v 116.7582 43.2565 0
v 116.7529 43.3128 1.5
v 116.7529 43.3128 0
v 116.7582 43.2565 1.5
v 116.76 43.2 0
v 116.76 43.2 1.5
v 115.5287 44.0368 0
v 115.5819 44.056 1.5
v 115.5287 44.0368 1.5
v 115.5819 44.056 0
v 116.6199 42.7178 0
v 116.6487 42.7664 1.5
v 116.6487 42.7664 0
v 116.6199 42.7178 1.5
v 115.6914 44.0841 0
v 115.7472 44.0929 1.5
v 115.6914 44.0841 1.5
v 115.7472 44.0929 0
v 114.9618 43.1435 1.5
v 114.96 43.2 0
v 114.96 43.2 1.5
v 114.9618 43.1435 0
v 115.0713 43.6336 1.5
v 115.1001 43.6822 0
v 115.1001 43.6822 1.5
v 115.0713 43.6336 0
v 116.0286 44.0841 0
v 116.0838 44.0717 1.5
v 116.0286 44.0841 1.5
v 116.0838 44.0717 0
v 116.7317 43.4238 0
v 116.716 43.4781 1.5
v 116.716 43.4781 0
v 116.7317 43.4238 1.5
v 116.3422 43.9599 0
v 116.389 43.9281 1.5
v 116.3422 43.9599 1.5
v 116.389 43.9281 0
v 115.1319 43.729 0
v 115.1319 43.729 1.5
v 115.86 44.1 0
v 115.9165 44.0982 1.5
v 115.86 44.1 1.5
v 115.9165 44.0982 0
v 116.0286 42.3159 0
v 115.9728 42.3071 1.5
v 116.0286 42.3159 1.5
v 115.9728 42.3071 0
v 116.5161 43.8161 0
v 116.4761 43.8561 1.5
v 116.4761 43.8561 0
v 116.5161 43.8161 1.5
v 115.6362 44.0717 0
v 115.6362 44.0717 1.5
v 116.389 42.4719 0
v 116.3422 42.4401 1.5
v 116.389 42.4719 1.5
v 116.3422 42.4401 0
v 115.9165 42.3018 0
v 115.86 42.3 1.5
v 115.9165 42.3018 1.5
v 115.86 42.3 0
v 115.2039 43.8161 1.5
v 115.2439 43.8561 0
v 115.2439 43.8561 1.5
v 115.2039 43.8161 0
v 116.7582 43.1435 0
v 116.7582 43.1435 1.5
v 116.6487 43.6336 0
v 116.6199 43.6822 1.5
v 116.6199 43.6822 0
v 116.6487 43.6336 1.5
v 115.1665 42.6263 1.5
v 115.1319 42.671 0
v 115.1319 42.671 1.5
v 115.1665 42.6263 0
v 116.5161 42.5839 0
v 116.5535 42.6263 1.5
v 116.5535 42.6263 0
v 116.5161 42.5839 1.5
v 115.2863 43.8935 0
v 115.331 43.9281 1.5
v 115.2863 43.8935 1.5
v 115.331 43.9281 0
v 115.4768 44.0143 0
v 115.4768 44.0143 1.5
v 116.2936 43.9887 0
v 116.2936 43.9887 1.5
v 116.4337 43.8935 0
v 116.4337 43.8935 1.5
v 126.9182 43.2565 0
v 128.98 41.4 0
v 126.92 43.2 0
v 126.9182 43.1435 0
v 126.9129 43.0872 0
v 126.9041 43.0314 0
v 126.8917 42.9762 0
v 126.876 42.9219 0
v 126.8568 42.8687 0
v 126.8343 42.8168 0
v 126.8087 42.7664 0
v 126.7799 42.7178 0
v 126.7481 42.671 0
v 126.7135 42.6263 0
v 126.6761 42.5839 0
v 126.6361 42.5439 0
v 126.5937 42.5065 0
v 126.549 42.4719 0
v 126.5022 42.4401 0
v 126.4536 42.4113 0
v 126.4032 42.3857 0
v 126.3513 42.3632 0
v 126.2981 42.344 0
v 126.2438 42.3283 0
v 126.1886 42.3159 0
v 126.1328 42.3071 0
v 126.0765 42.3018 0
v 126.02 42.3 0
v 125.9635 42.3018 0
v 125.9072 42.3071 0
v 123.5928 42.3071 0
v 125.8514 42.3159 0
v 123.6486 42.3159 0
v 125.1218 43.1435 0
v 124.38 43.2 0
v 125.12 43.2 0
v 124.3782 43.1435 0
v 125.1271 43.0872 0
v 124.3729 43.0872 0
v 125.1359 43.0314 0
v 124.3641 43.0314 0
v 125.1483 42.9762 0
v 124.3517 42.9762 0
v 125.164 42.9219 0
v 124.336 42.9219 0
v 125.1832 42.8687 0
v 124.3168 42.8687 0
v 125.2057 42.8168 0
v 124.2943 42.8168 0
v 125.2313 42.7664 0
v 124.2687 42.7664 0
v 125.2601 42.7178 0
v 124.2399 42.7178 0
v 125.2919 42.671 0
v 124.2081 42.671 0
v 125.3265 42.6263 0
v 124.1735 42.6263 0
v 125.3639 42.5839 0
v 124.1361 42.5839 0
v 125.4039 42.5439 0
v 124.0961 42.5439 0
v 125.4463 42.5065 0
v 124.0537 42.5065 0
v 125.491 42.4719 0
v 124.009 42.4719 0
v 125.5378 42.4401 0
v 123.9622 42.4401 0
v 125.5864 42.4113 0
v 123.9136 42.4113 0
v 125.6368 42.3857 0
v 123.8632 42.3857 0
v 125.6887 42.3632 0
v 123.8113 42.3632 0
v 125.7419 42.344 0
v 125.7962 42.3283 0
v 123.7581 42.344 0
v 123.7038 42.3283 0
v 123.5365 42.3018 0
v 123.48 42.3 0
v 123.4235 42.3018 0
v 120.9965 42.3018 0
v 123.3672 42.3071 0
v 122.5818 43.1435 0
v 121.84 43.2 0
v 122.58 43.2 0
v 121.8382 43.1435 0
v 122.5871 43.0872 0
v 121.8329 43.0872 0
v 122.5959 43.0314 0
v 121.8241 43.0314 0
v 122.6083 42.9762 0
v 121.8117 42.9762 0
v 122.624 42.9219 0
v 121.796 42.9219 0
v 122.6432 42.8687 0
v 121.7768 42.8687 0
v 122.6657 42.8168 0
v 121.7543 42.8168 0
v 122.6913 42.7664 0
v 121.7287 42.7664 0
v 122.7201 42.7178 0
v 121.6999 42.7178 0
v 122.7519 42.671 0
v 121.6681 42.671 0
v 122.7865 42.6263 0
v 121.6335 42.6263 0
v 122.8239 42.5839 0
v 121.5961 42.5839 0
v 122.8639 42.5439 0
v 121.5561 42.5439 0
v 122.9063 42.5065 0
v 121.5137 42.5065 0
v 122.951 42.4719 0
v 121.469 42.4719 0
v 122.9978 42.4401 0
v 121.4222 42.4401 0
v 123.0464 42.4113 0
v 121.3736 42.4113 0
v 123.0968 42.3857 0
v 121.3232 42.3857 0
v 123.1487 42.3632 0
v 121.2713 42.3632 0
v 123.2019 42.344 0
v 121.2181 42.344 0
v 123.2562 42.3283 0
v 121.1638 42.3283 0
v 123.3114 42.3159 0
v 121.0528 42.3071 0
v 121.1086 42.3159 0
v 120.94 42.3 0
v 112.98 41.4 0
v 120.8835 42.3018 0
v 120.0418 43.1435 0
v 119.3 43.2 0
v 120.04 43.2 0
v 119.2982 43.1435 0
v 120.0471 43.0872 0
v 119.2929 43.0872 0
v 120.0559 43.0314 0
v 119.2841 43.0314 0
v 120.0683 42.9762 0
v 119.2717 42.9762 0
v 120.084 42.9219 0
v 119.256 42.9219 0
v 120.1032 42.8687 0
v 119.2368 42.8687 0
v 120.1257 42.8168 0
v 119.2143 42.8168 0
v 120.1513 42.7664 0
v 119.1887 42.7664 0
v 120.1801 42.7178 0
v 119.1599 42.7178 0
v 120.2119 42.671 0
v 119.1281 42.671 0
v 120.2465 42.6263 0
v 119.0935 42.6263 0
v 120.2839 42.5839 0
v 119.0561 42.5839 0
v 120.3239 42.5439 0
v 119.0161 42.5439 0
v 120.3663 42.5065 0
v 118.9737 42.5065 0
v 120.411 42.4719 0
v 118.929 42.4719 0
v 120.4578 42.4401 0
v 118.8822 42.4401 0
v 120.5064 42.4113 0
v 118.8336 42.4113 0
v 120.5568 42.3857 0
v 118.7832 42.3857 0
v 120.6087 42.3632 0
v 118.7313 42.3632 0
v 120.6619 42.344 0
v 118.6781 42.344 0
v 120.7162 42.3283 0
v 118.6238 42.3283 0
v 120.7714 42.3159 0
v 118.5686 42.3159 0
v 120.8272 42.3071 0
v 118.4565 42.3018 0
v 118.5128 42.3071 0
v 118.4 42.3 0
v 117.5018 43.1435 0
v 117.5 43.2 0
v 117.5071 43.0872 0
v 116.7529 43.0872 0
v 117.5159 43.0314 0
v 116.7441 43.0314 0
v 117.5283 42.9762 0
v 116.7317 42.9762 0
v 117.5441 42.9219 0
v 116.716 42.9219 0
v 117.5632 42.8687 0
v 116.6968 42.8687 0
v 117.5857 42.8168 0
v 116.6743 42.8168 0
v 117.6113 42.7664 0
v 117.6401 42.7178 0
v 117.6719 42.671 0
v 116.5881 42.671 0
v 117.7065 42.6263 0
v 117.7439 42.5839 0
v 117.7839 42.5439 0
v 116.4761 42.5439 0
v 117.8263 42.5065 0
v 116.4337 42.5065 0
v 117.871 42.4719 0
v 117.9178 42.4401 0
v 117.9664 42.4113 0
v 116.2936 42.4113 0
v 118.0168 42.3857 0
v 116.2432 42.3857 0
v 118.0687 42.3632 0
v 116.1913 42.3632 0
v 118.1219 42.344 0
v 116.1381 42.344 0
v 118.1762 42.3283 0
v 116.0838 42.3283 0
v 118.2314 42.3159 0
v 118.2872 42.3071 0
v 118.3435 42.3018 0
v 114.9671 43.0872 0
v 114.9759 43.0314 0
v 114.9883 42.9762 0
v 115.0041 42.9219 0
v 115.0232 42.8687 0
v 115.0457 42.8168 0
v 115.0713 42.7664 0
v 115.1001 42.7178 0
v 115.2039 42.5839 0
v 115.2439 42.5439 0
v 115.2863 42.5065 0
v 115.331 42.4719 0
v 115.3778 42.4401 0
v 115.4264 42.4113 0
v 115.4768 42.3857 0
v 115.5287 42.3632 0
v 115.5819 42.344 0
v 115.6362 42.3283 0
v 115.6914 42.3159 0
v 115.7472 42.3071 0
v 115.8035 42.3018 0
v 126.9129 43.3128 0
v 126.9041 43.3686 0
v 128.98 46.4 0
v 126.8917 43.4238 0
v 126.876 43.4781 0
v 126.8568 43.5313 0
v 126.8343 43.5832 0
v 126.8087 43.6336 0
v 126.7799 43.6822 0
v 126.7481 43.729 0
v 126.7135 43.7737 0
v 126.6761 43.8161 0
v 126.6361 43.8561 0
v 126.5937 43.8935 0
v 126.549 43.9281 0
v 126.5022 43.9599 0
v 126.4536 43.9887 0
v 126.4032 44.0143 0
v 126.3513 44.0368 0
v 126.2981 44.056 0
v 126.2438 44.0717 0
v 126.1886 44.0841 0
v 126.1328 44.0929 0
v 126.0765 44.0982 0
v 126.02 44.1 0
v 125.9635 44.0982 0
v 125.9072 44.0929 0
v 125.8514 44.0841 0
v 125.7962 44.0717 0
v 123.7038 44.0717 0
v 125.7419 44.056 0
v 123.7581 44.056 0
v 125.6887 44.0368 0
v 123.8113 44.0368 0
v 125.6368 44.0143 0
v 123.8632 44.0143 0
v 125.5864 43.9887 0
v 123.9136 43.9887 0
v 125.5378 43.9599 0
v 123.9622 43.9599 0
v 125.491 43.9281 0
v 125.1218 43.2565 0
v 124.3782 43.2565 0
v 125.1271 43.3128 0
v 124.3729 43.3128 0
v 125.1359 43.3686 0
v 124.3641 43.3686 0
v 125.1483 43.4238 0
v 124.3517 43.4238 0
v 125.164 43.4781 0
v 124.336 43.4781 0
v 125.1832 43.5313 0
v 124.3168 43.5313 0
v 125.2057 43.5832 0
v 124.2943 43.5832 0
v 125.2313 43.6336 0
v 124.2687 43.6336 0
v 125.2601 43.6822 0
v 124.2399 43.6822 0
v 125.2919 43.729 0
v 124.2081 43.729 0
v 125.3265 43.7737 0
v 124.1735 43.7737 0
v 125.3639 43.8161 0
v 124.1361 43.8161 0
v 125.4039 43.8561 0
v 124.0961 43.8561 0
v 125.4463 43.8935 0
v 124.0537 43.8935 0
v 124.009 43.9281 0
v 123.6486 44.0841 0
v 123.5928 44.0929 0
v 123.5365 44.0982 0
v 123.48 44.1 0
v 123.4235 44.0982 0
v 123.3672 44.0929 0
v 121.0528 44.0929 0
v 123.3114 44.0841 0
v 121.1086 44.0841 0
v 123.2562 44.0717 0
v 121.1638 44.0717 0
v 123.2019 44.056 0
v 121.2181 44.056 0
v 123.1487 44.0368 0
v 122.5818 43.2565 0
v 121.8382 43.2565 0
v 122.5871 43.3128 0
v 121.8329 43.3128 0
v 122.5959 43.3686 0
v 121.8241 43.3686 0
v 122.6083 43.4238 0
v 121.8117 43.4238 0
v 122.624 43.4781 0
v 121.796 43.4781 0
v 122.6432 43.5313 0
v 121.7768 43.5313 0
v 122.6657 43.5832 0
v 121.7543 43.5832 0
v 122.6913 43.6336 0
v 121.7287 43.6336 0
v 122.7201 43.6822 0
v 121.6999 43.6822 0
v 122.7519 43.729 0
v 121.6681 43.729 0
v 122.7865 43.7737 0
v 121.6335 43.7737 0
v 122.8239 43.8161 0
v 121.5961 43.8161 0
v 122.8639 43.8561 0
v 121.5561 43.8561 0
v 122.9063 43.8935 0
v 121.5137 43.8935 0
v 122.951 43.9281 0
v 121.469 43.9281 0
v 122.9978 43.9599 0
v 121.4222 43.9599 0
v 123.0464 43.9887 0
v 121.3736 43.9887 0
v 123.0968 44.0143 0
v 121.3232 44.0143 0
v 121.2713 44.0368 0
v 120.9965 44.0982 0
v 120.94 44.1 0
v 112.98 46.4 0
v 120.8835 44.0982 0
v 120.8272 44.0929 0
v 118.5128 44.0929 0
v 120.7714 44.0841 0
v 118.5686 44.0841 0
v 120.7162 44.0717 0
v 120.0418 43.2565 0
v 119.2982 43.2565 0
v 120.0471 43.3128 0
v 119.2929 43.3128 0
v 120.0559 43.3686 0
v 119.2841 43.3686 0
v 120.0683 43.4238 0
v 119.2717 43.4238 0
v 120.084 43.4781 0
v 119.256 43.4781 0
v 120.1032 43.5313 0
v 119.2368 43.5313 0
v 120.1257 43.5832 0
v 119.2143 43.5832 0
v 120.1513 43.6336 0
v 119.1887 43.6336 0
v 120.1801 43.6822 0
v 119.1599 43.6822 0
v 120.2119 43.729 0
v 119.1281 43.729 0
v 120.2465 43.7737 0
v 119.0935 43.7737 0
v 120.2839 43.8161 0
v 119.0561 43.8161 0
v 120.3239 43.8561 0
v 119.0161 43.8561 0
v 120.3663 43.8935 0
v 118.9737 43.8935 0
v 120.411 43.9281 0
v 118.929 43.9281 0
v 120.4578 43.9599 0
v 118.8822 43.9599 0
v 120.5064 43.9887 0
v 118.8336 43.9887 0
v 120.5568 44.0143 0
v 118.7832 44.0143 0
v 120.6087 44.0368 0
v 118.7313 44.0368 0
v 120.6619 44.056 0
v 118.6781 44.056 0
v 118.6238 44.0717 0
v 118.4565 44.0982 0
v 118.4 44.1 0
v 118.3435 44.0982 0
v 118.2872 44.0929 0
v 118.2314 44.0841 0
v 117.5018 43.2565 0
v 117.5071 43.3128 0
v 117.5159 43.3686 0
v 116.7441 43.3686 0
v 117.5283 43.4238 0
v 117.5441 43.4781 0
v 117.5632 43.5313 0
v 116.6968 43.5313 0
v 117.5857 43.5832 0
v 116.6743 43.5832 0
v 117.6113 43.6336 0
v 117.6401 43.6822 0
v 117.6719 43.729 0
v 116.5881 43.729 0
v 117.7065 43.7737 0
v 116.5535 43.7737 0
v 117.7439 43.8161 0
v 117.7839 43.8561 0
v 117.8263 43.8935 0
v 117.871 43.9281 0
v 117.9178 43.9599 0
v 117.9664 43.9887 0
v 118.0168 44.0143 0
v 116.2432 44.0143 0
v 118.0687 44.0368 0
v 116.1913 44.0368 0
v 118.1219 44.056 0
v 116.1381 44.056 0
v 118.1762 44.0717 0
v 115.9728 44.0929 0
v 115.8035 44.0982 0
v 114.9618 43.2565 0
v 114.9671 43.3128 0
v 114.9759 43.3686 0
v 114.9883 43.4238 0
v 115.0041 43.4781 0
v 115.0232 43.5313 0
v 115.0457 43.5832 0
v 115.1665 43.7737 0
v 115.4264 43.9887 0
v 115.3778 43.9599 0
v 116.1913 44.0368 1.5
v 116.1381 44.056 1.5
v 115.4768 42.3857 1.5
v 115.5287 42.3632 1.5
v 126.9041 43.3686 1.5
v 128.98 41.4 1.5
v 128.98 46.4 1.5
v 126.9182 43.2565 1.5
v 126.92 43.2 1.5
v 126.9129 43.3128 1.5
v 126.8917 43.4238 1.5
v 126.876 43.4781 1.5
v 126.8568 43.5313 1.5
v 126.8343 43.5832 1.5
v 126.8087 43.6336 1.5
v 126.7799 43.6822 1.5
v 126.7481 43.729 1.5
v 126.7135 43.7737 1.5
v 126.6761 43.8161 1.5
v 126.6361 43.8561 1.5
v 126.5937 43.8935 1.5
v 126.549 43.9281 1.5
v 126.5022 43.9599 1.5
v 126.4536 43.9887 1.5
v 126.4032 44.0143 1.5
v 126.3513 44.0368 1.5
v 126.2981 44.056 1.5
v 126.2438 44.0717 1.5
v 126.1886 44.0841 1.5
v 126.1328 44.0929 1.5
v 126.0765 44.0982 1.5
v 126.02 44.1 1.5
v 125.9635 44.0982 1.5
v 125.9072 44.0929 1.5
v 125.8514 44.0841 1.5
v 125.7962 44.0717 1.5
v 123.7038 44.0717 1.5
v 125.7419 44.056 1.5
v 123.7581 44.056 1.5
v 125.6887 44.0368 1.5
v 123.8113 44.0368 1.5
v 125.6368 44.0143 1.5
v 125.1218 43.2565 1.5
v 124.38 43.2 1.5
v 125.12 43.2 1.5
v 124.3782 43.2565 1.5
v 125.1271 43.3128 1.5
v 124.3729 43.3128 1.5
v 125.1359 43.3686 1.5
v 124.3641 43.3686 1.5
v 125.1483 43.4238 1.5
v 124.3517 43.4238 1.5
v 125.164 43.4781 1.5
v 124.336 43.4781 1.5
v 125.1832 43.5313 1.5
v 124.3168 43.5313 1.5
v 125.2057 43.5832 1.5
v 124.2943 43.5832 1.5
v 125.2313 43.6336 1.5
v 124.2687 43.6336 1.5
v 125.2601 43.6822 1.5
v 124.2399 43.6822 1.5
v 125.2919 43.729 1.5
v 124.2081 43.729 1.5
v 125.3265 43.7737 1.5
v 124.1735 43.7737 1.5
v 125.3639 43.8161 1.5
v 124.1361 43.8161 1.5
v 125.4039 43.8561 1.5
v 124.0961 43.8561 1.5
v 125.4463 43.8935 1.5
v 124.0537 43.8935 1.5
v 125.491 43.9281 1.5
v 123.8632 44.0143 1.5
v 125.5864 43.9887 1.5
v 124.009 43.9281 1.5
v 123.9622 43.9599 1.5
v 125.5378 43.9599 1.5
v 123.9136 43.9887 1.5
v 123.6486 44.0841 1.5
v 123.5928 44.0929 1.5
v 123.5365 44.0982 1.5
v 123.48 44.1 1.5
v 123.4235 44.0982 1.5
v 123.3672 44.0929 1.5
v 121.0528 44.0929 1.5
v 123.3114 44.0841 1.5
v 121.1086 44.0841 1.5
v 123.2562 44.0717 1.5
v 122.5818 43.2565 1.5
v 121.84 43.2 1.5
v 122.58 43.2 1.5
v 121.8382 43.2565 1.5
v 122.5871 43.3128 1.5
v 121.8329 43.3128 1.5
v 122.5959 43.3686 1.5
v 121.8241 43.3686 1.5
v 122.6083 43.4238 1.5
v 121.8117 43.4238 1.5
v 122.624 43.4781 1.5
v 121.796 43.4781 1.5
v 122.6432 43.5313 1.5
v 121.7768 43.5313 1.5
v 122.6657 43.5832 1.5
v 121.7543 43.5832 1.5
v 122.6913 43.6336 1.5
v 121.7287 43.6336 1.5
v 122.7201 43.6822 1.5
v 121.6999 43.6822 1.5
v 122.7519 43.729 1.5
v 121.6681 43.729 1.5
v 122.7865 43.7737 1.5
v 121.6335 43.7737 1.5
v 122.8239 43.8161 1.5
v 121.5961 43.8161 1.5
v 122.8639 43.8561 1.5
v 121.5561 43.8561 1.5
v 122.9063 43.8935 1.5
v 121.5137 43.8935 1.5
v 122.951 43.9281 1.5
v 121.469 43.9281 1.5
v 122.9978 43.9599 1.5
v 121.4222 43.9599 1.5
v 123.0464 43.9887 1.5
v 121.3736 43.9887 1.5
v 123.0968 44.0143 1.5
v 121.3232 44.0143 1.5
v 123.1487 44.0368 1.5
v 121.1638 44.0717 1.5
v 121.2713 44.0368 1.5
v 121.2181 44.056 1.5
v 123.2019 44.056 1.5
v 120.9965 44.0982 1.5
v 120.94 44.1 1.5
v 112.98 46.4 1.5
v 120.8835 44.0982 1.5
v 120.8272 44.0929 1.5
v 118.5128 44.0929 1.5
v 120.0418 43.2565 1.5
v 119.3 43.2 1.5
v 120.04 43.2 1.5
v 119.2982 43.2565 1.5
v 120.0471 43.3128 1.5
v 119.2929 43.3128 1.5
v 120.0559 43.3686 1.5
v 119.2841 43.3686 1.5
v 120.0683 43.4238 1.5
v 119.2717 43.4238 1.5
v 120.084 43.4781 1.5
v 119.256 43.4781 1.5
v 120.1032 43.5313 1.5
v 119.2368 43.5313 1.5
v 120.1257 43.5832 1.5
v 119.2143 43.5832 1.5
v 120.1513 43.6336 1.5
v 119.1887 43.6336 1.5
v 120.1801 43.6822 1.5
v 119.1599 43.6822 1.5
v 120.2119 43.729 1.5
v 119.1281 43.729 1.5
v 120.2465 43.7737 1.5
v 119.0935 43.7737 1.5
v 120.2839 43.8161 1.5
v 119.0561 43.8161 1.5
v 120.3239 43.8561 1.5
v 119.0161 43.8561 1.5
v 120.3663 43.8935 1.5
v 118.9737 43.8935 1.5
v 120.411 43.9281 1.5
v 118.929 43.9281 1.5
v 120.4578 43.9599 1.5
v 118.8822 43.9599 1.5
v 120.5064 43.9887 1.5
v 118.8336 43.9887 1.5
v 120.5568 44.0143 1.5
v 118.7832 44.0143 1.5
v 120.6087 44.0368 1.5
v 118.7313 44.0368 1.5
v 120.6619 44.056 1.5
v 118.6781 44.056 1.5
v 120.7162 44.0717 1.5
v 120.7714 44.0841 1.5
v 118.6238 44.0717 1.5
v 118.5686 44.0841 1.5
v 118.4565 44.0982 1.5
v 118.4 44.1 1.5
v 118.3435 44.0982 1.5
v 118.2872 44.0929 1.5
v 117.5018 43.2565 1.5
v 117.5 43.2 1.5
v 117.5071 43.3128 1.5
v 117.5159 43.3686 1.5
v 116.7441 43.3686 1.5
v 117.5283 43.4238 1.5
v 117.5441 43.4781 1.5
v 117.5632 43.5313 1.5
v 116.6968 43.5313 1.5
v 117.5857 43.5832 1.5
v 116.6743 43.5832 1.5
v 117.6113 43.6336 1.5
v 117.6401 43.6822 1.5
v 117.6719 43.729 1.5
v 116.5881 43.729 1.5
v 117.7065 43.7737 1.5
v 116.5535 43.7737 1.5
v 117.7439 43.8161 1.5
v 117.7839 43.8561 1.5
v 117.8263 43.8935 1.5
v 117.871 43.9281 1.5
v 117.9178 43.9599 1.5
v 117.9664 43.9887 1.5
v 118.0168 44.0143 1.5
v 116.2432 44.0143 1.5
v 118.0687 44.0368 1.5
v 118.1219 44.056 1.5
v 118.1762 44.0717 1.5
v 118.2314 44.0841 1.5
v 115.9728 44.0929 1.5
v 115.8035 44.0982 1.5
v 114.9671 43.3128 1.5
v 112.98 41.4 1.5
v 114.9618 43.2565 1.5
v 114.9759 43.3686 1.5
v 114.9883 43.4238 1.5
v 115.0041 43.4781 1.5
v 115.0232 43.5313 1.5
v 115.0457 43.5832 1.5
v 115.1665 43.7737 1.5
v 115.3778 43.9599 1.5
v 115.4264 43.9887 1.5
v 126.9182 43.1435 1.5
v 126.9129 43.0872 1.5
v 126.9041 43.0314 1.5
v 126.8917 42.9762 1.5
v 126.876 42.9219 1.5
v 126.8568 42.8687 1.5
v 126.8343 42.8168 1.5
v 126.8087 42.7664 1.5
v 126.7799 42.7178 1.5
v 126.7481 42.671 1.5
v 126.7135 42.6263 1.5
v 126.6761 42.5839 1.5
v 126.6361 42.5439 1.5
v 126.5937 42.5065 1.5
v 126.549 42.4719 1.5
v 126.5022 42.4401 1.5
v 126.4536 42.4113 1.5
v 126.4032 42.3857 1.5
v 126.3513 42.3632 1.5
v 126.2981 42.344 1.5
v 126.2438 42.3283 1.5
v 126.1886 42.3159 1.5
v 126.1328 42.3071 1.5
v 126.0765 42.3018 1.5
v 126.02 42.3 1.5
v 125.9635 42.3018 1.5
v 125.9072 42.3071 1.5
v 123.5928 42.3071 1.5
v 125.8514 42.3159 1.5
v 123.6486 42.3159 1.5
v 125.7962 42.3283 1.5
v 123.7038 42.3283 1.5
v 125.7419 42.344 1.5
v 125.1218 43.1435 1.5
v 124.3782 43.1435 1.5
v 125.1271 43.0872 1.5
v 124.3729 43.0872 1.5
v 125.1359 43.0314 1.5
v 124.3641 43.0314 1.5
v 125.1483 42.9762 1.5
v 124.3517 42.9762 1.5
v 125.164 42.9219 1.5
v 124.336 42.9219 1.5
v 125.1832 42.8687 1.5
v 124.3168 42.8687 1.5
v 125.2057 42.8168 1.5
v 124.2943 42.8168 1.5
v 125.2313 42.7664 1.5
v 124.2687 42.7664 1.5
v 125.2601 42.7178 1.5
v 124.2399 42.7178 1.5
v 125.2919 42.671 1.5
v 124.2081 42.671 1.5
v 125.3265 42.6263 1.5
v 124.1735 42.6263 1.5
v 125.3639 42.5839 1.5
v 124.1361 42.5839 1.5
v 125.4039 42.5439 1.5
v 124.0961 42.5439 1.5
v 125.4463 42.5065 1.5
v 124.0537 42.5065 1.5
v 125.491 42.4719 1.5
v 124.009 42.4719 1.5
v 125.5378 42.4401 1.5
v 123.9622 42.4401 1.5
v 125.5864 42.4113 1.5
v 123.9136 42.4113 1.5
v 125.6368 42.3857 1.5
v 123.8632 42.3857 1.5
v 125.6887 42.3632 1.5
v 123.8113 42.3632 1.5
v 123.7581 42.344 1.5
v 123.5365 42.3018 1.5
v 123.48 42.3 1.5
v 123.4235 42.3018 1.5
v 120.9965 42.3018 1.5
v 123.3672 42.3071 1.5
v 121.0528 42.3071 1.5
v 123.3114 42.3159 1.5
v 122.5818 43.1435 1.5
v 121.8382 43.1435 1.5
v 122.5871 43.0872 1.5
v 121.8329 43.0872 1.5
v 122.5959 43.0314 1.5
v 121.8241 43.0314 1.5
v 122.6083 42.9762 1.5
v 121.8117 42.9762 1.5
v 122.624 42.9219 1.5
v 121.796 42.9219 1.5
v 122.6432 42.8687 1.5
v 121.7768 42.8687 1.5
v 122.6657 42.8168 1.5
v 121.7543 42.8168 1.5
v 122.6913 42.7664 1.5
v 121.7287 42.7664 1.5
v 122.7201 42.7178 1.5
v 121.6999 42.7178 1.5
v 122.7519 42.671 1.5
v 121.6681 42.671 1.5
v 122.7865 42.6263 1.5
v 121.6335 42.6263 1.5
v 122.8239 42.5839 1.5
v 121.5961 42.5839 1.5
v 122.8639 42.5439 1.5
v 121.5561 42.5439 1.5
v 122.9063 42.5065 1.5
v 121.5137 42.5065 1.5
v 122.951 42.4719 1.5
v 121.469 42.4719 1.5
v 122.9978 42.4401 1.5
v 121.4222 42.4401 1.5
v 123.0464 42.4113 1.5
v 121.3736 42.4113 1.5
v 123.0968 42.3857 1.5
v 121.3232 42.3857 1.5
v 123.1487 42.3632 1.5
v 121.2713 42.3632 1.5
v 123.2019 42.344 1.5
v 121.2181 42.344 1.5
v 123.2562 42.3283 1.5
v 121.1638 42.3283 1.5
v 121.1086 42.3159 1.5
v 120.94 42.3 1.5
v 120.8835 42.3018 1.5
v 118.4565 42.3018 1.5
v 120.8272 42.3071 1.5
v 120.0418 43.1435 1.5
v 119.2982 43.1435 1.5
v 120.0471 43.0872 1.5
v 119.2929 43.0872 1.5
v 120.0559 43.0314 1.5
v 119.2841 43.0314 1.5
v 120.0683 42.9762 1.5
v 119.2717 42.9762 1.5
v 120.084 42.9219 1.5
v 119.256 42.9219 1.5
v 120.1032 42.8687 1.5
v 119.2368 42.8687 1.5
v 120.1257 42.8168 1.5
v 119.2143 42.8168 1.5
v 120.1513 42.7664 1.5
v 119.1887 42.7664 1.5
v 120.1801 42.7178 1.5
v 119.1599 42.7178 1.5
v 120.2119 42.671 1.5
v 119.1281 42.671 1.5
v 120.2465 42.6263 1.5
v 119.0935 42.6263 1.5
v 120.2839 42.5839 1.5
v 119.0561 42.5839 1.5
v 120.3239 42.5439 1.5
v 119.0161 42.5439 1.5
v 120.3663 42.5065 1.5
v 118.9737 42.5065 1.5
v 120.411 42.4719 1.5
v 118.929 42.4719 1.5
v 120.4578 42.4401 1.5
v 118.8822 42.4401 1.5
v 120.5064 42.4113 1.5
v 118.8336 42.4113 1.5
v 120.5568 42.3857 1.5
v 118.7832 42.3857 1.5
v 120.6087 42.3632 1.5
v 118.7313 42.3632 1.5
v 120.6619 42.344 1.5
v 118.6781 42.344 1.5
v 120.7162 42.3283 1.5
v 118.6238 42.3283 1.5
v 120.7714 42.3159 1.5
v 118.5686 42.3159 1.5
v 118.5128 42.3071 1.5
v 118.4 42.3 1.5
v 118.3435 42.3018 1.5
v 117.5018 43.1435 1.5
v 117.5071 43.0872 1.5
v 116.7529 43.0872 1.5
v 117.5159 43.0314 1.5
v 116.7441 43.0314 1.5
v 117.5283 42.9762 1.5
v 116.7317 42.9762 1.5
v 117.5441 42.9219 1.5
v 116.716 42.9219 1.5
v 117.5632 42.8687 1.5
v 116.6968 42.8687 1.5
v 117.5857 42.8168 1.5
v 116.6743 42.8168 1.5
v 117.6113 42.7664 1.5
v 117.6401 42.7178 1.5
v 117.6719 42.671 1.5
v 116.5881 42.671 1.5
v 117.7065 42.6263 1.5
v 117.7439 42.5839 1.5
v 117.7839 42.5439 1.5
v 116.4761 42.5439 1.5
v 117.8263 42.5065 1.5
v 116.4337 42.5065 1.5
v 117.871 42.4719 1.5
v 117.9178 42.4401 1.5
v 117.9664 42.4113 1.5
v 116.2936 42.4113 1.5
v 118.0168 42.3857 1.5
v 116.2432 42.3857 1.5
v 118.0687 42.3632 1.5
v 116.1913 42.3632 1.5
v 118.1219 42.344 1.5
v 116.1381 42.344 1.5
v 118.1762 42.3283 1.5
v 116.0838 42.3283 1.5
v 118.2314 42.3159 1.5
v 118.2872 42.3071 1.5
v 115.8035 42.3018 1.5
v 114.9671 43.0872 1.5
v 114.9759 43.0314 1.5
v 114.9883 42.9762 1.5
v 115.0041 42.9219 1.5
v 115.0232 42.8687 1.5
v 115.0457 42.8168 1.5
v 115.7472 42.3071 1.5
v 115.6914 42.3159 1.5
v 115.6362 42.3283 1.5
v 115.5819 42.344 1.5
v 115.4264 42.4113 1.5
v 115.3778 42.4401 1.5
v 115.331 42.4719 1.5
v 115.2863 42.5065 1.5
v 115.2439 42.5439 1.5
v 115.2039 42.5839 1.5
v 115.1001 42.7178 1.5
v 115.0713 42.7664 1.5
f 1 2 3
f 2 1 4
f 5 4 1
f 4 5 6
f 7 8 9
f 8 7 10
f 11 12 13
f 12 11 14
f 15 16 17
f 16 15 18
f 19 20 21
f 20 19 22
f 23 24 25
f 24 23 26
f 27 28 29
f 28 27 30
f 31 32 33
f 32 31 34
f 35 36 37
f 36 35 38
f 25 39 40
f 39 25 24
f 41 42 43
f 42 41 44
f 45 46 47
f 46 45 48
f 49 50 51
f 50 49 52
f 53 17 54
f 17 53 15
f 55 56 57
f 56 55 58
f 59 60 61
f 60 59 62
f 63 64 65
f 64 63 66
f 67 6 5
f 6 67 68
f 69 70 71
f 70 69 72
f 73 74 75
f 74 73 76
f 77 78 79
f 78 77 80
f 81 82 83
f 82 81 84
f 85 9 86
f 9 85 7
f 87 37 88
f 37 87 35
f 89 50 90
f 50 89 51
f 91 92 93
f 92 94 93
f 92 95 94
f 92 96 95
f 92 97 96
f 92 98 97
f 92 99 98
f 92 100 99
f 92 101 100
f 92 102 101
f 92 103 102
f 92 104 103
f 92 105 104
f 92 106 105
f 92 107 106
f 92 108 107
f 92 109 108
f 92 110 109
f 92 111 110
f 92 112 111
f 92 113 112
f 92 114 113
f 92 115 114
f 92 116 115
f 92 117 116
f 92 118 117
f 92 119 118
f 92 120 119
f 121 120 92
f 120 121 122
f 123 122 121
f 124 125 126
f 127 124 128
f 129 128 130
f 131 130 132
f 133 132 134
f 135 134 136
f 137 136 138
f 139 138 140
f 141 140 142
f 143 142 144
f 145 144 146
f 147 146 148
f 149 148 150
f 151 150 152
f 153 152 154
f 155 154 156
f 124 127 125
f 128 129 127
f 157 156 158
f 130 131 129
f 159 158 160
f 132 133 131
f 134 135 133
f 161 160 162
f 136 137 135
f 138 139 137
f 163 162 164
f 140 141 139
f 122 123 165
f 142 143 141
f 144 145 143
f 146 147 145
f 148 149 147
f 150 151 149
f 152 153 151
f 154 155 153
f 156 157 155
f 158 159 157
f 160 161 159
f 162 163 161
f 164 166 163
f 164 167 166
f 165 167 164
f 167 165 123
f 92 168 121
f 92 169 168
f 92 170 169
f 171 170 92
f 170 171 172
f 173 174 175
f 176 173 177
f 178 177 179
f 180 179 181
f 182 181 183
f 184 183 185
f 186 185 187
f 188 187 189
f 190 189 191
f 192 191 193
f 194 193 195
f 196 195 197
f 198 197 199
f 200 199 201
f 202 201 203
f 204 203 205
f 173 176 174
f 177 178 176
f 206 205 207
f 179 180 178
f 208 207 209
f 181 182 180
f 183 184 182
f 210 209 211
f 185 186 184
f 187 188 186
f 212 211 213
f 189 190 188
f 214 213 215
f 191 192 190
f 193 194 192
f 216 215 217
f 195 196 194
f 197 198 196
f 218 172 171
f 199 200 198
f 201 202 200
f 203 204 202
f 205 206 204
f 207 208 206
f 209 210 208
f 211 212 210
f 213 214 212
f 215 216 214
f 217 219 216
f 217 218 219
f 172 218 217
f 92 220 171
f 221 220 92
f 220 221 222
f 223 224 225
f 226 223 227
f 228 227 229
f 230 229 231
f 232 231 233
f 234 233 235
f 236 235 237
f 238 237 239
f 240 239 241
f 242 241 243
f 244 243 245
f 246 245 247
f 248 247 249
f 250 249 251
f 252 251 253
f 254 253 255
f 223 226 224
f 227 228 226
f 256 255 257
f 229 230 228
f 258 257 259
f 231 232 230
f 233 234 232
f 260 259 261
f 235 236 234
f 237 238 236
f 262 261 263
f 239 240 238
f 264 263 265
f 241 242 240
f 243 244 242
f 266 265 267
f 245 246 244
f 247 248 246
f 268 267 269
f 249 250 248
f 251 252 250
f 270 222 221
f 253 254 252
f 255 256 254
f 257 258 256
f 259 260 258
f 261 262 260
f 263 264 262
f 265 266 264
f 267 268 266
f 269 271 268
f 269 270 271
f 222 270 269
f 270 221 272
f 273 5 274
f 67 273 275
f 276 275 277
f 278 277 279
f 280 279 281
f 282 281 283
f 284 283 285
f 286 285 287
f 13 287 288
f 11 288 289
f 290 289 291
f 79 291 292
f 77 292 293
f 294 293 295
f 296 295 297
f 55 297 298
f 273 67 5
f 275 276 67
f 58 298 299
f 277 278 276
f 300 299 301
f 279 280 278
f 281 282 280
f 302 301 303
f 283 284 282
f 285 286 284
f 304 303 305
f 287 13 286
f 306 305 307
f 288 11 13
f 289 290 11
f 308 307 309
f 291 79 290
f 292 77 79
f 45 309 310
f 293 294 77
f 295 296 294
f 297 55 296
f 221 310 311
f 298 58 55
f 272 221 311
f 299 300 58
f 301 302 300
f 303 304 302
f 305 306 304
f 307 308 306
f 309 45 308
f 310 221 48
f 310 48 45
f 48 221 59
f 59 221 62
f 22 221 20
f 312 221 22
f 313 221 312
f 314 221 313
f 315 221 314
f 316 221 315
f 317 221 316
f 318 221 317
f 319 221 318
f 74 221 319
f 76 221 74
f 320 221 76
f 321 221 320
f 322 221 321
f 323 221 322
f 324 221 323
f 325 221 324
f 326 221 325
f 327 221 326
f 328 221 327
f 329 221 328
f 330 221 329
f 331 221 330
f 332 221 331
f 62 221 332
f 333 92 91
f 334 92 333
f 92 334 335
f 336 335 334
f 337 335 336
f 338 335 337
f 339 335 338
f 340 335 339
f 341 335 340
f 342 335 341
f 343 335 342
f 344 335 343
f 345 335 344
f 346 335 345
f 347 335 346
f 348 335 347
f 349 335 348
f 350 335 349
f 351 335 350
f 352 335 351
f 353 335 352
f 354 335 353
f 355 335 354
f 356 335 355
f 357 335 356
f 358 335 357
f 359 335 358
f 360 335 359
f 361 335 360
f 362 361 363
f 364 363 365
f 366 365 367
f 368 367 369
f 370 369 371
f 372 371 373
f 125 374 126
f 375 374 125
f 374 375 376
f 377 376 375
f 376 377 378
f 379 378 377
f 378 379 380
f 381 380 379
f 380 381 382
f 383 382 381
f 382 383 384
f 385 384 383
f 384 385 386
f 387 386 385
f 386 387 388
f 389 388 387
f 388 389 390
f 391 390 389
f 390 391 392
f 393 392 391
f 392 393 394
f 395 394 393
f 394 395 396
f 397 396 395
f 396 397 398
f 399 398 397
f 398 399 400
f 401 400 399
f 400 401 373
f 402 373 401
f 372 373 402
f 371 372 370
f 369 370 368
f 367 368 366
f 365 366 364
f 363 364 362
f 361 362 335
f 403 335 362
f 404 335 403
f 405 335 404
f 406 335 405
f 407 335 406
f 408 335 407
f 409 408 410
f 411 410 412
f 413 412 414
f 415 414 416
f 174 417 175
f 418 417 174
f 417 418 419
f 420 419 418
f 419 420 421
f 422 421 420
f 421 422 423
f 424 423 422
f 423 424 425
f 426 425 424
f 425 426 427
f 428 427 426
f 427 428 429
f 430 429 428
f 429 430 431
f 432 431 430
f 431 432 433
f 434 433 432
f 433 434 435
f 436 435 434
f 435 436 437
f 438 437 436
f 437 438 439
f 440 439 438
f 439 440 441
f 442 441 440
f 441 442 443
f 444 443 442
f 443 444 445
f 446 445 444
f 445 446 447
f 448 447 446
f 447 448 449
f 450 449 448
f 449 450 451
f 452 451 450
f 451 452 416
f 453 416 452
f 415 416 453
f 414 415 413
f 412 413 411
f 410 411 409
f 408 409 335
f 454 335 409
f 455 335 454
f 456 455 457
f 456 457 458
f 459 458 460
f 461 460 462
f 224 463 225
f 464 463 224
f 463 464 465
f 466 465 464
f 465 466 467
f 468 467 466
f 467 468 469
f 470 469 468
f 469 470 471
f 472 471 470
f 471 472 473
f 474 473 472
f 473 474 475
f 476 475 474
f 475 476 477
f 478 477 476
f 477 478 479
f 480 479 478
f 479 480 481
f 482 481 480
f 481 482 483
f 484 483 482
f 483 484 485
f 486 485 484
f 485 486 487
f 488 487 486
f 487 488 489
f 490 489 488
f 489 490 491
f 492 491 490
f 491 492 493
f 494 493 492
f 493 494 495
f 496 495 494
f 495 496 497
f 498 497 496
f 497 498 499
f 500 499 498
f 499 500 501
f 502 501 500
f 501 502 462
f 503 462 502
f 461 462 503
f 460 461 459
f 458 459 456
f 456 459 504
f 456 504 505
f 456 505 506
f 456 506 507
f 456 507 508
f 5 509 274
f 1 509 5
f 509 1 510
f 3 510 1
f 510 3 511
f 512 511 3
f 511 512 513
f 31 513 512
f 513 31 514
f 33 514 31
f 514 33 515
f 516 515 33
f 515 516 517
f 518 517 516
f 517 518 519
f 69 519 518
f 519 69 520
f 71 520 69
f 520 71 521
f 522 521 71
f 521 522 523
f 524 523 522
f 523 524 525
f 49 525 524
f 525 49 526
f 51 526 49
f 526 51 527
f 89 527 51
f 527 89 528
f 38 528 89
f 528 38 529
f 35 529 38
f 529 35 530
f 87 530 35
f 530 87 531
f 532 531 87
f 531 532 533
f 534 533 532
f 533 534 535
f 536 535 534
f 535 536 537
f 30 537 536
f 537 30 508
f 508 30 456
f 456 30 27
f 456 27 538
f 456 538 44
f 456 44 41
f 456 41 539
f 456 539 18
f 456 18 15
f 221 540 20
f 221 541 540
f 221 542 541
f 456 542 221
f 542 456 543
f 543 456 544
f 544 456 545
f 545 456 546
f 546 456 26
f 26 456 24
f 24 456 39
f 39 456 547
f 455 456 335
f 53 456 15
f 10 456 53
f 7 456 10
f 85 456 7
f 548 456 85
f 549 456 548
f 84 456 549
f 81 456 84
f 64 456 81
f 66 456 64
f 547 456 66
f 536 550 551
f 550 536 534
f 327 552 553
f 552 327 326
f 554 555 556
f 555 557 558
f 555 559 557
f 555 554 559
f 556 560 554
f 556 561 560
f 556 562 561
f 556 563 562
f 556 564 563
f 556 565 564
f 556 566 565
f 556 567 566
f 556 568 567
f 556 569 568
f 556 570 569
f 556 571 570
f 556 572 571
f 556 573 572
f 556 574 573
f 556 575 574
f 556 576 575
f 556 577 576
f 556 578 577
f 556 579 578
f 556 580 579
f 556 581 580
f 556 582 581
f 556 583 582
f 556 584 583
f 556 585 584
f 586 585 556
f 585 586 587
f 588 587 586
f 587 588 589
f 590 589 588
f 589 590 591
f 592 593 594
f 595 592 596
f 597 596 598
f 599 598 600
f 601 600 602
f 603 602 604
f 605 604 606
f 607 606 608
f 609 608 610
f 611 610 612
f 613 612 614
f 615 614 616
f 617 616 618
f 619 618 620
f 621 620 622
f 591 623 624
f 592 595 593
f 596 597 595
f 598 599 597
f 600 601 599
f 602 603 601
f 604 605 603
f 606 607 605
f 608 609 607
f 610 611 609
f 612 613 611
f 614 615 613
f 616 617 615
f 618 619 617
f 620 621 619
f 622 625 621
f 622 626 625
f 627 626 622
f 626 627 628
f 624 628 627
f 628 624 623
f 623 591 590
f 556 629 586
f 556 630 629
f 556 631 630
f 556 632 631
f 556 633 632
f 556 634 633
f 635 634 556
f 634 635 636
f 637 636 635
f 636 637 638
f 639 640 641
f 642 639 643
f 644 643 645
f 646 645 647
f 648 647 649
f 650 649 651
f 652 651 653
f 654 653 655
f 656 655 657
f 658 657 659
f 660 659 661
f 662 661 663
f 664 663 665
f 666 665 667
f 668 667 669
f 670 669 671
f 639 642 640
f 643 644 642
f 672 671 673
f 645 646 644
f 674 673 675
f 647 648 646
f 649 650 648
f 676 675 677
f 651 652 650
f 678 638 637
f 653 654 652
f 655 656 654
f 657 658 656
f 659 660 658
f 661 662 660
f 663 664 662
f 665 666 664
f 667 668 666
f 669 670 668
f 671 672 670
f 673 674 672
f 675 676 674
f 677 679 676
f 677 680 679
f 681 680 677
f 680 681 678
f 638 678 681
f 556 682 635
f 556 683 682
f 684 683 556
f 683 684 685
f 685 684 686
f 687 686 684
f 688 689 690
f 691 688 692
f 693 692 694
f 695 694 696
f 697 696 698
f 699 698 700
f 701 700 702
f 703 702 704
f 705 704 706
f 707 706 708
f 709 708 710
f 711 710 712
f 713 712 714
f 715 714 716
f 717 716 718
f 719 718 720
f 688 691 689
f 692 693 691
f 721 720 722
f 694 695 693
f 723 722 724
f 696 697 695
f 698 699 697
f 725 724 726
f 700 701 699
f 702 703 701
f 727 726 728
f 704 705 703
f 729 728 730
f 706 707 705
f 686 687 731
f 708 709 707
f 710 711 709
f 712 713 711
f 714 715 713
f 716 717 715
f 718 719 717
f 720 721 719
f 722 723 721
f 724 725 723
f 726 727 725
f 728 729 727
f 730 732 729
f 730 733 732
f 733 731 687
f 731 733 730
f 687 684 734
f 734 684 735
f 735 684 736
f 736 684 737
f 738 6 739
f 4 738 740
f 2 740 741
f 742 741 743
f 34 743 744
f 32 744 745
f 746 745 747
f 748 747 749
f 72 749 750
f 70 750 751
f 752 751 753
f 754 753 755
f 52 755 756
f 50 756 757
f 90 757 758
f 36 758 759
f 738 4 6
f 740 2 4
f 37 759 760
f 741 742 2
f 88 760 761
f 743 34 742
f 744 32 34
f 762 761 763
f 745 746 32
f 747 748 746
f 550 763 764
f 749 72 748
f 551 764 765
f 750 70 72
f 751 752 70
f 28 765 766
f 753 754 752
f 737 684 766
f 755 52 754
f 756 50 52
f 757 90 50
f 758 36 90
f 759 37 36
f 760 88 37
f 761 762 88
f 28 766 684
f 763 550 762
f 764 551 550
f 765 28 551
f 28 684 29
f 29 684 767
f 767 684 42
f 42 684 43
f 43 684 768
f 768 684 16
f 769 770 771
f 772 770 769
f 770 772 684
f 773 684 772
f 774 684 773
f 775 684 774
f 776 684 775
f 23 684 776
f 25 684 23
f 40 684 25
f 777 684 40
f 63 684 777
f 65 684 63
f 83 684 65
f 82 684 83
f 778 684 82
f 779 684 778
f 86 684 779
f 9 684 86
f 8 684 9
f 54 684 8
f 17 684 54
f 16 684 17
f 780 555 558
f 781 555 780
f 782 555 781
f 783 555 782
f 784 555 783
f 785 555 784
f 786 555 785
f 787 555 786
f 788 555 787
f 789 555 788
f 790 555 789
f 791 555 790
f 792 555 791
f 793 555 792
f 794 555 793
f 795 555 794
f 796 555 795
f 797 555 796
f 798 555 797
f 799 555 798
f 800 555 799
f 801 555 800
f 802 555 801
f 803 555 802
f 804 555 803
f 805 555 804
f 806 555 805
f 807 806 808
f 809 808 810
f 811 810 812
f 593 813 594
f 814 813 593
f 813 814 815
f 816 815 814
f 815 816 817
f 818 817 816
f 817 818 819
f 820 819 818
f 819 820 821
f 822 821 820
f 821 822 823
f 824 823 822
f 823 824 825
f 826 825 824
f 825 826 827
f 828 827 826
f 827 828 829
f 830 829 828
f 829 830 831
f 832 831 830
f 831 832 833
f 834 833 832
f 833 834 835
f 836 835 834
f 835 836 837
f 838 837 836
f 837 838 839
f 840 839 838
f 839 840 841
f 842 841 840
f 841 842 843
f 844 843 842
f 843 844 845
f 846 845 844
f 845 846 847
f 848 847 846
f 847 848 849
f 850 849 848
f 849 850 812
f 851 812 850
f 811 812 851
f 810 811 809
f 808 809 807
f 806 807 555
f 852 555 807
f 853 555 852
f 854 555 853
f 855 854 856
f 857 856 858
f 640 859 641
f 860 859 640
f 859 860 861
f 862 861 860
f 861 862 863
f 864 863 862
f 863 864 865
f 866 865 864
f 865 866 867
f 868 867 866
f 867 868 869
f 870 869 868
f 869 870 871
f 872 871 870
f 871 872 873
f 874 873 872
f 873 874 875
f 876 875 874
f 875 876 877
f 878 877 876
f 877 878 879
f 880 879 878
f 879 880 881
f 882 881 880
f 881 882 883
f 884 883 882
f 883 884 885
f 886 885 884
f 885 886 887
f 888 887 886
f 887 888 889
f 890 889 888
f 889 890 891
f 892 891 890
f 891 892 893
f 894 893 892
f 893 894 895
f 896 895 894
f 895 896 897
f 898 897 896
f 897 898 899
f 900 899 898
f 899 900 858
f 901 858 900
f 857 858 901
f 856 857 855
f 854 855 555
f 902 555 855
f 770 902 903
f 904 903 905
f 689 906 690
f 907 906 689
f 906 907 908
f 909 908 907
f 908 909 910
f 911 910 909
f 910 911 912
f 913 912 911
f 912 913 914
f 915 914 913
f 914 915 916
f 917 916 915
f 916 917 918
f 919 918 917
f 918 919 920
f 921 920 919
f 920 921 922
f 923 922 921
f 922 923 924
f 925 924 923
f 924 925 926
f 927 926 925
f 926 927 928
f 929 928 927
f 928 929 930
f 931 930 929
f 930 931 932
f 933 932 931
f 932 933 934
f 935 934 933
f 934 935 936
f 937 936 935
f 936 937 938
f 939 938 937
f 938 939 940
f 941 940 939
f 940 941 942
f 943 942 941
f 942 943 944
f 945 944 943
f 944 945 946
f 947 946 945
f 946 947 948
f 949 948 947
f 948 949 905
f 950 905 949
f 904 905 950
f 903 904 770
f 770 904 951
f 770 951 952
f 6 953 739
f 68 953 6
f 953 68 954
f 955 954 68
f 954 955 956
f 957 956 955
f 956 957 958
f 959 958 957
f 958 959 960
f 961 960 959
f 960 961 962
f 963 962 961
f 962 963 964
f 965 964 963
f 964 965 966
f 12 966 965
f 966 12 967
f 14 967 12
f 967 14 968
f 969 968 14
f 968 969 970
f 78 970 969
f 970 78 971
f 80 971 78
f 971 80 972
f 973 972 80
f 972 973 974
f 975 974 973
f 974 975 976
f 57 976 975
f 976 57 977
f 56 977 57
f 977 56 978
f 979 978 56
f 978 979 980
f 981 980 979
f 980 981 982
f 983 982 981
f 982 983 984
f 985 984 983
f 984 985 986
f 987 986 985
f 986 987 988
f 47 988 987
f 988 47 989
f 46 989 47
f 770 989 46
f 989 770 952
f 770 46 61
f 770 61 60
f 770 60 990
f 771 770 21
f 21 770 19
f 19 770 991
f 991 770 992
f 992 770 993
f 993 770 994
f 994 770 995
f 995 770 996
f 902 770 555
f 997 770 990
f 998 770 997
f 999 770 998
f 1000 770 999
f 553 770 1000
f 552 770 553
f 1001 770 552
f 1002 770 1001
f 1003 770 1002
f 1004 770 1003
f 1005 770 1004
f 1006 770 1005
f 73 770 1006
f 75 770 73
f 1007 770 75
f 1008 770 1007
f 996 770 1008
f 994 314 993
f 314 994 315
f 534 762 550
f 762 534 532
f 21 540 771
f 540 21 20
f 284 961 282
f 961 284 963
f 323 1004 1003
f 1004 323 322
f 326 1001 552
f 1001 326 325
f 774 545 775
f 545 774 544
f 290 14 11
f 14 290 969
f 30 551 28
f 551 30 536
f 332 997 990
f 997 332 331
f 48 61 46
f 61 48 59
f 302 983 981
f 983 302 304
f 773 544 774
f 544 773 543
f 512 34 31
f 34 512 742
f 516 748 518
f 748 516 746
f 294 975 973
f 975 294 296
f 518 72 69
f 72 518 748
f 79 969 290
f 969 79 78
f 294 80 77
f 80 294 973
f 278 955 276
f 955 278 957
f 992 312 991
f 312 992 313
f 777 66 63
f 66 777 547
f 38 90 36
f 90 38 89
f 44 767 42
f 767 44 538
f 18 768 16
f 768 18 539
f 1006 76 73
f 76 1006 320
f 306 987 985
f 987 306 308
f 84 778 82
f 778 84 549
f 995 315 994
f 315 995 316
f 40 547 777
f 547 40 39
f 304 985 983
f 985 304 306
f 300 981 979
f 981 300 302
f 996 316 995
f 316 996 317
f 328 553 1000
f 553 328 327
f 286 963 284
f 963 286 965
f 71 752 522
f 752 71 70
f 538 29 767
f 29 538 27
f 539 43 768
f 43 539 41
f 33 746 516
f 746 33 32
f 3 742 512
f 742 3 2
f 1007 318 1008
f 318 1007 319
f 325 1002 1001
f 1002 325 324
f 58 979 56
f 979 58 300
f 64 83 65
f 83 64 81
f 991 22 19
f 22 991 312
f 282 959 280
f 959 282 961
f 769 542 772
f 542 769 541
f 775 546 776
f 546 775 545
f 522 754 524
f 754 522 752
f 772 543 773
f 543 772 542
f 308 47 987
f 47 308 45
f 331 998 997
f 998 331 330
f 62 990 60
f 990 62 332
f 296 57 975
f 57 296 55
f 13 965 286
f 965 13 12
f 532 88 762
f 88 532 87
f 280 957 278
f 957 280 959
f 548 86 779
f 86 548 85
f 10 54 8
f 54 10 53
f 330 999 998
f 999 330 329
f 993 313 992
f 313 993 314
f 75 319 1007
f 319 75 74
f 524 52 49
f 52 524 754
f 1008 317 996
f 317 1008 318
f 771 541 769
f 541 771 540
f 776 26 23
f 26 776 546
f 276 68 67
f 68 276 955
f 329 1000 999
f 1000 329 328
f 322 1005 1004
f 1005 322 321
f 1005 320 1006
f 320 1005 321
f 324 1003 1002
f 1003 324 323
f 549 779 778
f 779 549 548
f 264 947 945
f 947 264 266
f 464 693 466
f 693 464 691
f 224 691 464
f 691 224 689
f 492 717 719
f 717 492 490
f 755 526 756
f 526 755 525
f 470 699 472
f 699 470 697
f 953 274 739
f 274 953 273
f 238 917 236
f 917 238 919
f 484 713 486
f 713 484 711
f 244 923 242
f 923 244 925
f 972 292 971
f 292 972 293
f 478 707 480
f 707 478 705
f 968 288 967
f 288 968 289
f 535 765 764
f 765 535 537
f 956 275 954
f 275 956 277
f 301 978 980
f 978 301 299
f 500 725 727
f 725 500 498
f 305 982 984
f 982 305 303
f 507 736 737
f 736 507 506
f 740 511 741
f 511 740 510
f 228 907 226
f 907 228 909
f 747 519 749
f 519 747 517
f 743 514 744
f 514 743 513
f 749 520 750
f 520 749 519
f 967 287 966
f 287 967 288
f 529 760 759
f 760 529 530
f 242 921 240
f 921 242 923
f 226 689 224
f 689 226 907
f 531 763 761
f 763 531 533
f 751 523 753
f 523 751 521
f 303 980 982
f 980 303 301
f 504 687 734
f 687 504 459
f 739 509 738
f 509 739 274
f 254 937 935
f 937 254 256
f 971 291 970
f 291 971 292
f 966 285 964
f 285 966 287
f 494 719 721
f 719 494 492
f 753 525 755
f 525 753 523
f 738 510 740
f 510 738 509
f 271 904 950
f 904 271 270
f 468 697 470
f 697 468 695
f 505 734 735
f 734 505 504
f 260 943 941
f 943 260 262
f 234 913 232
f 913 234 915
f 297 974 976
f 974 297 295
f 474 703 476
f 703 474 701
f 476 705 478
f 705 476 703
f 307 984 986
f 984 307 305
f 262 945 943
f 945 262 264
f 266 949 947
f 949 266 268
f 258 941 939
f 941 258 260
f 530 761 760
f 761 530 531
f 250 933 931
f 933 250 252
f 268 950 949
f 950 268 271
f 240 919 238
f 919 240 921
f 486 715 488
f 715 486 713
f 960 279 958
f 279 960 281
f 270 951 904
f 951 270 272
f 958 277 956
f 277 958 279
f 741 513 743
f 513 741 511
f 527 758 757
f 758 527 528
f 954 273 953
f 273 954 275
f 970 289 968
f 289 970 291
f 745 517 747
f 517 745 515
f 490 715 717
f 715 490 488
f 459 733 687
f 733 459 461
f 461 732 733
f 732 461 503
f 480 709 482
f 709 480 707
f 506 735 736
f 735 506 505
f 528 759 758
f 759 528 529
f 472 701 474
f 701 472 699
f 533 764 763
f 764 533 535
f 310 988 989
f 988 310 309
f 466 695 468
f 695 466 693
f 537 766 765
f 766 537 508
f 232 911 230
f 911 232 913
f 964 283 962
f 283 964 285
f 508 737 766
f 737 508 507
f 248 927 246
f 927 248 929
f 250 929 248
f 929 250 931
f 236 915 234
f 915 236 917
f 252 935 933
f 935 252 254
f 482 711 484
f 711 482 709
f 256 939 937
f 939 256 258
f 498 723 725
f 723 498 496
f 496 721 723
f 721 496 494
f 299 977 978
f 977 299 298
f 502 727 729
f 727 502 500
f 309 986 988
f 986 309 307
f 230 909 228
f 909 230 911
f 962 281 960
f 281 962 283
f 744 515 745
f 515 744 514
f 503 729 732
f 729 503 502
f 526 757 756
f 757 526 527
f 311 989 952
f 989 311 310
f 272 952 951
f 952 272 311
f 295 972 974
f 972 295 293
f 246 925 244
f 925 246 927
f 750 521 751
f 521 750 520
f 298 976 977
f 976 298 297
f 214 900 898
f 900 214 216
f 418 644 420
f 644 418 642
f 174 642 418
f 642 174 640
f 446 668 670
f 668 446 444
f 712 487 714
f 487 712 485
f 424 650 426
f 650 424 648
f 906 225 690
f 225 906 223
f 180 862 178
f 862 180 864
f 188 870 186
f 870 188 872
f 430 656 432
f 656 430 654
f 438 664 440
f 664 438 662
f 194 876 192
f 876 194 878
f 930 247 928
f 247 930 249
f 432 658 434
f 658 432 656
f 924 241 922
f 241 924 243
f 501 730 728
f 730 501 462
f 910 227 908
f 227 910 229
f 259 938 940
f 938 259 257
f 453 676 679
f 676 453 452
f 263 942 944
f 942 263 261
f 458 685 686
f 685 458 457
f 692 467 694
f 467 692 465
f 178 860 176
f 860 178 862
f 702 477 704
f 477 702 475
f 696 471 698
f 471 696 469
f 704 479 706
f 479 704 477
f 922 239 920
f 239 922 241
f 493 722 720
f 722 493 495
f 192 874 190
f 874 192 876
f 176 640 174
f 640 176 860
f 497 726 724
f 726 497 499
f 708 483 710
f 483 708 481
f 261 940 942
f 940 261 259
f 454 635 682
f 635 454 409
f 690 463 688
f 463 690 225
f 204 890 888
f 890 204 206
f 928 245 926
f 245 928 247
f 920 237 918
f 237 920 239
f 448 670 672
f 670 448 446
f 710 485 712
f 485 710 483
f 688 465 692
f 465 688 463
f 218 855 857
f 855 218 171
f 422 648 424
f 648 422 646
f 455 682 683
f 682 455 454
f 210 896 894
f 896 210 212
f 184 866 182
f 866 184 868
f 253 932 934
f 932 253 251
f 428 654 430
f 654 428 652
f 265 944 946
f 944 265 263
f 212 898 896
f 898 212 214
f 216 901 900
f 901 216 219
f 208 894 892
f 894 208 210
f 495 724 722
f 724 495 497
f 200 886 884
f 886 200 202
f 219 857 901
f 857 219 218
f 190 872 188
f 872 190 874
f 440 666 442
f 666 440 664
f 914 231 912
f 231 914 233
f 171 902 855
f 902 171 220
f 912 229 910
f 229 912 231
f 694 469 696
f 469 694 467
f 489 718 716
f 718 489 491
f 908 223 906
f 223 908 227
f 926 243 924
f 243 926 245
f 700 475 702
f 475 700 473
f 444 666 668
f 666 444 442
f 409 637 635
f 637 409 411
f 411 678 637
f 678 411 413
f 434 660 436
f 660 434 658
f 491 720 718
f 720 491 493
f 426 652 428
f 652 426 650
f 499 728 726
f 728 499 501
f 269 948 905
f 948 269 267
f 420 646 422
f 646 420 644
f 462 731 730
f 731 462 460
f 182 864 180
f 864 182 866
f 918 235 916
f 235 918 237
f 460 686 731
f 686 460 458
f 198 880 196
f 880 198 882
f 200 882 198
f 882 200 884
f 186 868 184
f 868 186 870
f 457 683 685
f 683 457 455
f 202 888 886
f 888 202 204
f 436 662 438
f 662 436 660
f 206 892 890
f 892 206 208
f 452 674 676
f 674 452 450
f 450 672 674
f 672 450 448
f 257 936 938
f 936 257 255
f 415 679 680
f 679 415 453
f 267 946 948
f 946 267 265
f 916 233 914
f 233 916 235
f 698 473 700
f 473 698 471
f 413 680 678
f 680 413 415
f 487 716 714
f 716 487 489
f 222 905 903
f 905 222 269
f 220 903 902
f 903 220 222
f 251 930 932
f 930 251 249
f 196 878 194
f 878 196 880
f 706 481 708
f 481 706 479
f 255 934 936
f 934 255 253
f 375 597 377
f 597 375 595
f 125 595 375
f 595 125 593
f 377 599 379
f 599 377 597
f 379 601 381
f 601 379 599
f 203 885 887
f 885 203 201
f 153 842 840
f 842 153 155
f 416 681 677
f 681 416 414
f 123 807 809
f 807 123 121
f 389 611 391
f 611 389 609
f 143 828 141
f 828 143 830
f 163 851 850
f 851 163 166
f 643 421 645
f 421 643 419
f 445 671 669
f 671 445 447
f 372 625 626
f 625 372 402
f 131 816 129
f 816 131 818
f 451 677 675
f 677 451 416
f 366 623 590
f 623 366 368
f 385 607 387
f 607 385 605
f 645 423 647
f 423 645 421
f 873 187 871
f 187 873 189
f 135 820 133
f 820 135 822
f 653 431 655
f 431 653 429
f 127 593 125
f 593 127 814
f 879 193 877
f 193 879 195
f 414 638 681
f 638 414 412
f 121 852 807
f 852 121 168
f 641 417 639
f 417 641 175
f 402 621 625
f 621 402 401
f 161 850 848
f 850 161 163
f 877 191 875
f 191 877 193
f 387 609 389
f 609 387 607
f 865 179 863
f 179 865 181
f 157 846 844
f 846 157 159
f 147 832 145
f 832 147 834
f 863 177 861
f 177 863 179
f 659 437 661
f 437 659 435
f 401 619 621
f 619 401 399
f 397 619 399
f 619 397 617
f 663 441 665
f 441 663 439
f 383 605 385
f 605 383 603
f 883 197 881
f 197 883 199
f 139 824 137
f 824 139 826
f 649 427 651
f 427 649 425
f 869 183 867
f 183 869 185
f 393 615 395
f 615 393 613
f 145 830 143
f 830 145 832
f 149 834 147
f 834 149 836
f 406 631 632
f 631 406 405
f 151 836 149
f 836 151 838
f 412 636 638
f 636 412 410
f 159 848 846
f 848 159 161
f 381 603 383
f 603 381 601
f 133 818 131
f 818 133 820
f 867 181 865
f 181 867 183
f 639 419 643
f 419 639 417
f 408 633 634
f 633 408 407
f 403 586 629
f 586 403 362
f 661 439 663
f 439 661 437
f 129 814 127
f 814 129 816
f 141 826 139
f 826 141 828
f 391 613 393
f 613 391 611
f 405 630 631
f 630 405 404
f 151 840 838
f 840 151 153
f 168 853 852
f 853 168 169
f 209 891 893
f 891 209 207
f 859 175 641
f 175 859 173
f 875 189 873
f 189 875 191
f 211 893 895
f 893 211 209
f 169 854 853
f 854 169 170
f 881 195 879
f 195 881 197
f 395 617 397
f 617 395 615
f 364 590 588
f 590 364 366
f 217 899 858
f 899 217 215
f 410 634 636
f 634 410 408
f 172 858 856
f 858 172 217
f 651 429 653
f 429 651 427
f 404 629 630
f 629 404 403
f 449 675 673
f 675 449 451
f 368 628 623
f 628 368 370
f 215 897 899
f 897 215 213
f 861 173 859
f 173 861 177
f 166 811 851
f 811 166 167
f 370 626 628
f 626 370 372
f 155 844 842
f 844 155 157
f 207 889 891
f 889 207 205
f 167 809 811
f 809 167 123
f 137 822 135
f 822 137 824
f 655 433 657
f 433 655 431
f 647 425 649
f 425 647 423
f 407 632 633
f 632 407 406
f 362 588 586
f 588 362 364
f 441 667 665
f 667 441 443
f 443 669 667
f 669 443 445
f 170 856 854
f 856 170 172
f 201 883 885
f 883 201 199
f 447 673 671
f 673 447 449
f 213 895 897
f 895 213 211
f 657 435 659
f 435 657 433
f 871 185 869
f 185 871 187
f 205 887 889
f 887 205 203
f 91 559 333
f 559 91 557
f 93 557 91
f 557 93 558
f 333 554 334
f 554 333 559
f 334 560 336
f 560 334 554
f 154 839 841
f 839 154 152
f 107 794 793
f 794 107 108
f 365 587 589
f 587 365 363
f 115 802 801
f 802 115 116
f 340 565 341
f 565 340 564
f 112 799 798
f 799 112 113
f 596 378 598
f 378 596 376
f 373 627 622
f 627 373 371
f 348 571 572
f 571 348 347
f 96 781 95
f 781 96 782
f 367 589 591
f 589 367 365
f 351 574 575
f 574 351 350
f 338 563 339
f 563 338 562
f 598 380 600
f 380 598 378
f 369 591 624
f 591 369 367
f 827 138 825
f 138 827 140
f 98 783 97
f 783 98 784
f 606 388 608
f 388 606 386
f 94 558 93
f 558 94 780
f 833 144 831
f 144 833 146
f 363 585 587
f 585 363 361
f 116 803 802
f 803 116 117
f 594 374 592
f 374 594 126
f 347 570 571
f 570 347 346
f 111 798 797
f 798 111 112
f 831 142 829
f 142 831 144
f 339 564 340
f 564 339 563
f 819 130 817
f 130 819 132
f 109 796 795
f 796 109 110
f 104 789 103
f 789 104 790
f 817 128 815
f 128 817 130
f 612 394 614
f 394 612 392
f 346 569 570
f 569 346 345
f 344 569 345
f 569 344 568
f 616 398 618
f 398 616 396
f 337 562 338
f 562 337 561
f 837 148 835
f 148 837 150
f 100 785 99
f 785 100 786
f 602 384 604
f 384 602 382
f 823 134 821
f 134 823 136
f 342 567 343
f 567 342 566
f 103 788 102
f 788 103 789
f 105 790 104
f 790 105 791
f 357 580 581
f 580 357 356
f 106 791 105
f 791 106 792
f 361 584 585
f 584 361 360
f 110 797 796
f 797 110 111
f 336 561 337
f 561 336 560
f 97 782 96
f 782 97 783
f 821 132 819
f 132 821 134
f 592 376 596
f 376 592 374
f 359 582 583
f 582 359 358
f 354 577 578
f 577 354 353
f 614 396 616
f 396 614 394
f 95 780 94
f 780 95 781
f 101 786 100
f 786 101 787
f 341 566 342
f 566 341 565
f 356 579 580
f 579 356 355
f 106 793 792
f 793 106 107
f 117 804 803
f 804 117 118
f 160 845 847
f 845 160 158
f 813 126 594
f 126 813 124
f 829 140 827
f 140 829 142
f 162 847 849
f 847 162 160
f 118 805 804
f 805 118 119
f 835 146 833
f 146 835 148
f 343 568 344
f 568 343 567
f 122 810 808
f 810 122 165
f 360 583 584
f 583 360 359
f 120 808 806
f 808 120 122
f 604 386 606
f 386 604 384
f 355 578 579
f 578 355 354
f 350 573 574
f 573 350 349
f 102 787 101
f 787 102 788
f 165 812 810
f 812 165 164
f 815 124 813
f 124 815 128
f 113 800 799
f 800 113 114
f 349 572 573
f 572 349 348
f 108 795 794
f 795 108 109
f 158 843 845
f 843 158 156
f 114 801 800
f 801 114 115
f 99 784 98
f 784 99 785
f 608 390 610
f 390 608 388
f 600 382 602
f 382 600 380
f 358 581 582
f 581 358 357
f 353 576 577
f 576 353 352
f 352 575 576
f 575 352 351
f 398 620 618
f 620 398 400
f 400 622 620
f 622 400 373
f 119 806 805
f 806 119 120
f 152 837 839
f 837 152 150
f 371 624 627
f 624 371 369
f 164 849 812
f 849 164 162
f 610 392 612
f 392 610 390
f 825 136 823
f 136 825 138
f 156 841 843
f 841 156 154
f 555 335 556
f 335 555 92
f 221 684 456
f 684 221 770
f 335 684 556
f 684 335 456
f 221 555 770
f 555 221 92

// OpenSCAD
$fn=100;
difference() {
    translate([112.98,41.4,0]) cube([16,5,1.5]);
    for (x = [0:4]) {translate([(x*2.54)+115.86,43.2,0]) cylinder(1.5,d=1.8);}
}
